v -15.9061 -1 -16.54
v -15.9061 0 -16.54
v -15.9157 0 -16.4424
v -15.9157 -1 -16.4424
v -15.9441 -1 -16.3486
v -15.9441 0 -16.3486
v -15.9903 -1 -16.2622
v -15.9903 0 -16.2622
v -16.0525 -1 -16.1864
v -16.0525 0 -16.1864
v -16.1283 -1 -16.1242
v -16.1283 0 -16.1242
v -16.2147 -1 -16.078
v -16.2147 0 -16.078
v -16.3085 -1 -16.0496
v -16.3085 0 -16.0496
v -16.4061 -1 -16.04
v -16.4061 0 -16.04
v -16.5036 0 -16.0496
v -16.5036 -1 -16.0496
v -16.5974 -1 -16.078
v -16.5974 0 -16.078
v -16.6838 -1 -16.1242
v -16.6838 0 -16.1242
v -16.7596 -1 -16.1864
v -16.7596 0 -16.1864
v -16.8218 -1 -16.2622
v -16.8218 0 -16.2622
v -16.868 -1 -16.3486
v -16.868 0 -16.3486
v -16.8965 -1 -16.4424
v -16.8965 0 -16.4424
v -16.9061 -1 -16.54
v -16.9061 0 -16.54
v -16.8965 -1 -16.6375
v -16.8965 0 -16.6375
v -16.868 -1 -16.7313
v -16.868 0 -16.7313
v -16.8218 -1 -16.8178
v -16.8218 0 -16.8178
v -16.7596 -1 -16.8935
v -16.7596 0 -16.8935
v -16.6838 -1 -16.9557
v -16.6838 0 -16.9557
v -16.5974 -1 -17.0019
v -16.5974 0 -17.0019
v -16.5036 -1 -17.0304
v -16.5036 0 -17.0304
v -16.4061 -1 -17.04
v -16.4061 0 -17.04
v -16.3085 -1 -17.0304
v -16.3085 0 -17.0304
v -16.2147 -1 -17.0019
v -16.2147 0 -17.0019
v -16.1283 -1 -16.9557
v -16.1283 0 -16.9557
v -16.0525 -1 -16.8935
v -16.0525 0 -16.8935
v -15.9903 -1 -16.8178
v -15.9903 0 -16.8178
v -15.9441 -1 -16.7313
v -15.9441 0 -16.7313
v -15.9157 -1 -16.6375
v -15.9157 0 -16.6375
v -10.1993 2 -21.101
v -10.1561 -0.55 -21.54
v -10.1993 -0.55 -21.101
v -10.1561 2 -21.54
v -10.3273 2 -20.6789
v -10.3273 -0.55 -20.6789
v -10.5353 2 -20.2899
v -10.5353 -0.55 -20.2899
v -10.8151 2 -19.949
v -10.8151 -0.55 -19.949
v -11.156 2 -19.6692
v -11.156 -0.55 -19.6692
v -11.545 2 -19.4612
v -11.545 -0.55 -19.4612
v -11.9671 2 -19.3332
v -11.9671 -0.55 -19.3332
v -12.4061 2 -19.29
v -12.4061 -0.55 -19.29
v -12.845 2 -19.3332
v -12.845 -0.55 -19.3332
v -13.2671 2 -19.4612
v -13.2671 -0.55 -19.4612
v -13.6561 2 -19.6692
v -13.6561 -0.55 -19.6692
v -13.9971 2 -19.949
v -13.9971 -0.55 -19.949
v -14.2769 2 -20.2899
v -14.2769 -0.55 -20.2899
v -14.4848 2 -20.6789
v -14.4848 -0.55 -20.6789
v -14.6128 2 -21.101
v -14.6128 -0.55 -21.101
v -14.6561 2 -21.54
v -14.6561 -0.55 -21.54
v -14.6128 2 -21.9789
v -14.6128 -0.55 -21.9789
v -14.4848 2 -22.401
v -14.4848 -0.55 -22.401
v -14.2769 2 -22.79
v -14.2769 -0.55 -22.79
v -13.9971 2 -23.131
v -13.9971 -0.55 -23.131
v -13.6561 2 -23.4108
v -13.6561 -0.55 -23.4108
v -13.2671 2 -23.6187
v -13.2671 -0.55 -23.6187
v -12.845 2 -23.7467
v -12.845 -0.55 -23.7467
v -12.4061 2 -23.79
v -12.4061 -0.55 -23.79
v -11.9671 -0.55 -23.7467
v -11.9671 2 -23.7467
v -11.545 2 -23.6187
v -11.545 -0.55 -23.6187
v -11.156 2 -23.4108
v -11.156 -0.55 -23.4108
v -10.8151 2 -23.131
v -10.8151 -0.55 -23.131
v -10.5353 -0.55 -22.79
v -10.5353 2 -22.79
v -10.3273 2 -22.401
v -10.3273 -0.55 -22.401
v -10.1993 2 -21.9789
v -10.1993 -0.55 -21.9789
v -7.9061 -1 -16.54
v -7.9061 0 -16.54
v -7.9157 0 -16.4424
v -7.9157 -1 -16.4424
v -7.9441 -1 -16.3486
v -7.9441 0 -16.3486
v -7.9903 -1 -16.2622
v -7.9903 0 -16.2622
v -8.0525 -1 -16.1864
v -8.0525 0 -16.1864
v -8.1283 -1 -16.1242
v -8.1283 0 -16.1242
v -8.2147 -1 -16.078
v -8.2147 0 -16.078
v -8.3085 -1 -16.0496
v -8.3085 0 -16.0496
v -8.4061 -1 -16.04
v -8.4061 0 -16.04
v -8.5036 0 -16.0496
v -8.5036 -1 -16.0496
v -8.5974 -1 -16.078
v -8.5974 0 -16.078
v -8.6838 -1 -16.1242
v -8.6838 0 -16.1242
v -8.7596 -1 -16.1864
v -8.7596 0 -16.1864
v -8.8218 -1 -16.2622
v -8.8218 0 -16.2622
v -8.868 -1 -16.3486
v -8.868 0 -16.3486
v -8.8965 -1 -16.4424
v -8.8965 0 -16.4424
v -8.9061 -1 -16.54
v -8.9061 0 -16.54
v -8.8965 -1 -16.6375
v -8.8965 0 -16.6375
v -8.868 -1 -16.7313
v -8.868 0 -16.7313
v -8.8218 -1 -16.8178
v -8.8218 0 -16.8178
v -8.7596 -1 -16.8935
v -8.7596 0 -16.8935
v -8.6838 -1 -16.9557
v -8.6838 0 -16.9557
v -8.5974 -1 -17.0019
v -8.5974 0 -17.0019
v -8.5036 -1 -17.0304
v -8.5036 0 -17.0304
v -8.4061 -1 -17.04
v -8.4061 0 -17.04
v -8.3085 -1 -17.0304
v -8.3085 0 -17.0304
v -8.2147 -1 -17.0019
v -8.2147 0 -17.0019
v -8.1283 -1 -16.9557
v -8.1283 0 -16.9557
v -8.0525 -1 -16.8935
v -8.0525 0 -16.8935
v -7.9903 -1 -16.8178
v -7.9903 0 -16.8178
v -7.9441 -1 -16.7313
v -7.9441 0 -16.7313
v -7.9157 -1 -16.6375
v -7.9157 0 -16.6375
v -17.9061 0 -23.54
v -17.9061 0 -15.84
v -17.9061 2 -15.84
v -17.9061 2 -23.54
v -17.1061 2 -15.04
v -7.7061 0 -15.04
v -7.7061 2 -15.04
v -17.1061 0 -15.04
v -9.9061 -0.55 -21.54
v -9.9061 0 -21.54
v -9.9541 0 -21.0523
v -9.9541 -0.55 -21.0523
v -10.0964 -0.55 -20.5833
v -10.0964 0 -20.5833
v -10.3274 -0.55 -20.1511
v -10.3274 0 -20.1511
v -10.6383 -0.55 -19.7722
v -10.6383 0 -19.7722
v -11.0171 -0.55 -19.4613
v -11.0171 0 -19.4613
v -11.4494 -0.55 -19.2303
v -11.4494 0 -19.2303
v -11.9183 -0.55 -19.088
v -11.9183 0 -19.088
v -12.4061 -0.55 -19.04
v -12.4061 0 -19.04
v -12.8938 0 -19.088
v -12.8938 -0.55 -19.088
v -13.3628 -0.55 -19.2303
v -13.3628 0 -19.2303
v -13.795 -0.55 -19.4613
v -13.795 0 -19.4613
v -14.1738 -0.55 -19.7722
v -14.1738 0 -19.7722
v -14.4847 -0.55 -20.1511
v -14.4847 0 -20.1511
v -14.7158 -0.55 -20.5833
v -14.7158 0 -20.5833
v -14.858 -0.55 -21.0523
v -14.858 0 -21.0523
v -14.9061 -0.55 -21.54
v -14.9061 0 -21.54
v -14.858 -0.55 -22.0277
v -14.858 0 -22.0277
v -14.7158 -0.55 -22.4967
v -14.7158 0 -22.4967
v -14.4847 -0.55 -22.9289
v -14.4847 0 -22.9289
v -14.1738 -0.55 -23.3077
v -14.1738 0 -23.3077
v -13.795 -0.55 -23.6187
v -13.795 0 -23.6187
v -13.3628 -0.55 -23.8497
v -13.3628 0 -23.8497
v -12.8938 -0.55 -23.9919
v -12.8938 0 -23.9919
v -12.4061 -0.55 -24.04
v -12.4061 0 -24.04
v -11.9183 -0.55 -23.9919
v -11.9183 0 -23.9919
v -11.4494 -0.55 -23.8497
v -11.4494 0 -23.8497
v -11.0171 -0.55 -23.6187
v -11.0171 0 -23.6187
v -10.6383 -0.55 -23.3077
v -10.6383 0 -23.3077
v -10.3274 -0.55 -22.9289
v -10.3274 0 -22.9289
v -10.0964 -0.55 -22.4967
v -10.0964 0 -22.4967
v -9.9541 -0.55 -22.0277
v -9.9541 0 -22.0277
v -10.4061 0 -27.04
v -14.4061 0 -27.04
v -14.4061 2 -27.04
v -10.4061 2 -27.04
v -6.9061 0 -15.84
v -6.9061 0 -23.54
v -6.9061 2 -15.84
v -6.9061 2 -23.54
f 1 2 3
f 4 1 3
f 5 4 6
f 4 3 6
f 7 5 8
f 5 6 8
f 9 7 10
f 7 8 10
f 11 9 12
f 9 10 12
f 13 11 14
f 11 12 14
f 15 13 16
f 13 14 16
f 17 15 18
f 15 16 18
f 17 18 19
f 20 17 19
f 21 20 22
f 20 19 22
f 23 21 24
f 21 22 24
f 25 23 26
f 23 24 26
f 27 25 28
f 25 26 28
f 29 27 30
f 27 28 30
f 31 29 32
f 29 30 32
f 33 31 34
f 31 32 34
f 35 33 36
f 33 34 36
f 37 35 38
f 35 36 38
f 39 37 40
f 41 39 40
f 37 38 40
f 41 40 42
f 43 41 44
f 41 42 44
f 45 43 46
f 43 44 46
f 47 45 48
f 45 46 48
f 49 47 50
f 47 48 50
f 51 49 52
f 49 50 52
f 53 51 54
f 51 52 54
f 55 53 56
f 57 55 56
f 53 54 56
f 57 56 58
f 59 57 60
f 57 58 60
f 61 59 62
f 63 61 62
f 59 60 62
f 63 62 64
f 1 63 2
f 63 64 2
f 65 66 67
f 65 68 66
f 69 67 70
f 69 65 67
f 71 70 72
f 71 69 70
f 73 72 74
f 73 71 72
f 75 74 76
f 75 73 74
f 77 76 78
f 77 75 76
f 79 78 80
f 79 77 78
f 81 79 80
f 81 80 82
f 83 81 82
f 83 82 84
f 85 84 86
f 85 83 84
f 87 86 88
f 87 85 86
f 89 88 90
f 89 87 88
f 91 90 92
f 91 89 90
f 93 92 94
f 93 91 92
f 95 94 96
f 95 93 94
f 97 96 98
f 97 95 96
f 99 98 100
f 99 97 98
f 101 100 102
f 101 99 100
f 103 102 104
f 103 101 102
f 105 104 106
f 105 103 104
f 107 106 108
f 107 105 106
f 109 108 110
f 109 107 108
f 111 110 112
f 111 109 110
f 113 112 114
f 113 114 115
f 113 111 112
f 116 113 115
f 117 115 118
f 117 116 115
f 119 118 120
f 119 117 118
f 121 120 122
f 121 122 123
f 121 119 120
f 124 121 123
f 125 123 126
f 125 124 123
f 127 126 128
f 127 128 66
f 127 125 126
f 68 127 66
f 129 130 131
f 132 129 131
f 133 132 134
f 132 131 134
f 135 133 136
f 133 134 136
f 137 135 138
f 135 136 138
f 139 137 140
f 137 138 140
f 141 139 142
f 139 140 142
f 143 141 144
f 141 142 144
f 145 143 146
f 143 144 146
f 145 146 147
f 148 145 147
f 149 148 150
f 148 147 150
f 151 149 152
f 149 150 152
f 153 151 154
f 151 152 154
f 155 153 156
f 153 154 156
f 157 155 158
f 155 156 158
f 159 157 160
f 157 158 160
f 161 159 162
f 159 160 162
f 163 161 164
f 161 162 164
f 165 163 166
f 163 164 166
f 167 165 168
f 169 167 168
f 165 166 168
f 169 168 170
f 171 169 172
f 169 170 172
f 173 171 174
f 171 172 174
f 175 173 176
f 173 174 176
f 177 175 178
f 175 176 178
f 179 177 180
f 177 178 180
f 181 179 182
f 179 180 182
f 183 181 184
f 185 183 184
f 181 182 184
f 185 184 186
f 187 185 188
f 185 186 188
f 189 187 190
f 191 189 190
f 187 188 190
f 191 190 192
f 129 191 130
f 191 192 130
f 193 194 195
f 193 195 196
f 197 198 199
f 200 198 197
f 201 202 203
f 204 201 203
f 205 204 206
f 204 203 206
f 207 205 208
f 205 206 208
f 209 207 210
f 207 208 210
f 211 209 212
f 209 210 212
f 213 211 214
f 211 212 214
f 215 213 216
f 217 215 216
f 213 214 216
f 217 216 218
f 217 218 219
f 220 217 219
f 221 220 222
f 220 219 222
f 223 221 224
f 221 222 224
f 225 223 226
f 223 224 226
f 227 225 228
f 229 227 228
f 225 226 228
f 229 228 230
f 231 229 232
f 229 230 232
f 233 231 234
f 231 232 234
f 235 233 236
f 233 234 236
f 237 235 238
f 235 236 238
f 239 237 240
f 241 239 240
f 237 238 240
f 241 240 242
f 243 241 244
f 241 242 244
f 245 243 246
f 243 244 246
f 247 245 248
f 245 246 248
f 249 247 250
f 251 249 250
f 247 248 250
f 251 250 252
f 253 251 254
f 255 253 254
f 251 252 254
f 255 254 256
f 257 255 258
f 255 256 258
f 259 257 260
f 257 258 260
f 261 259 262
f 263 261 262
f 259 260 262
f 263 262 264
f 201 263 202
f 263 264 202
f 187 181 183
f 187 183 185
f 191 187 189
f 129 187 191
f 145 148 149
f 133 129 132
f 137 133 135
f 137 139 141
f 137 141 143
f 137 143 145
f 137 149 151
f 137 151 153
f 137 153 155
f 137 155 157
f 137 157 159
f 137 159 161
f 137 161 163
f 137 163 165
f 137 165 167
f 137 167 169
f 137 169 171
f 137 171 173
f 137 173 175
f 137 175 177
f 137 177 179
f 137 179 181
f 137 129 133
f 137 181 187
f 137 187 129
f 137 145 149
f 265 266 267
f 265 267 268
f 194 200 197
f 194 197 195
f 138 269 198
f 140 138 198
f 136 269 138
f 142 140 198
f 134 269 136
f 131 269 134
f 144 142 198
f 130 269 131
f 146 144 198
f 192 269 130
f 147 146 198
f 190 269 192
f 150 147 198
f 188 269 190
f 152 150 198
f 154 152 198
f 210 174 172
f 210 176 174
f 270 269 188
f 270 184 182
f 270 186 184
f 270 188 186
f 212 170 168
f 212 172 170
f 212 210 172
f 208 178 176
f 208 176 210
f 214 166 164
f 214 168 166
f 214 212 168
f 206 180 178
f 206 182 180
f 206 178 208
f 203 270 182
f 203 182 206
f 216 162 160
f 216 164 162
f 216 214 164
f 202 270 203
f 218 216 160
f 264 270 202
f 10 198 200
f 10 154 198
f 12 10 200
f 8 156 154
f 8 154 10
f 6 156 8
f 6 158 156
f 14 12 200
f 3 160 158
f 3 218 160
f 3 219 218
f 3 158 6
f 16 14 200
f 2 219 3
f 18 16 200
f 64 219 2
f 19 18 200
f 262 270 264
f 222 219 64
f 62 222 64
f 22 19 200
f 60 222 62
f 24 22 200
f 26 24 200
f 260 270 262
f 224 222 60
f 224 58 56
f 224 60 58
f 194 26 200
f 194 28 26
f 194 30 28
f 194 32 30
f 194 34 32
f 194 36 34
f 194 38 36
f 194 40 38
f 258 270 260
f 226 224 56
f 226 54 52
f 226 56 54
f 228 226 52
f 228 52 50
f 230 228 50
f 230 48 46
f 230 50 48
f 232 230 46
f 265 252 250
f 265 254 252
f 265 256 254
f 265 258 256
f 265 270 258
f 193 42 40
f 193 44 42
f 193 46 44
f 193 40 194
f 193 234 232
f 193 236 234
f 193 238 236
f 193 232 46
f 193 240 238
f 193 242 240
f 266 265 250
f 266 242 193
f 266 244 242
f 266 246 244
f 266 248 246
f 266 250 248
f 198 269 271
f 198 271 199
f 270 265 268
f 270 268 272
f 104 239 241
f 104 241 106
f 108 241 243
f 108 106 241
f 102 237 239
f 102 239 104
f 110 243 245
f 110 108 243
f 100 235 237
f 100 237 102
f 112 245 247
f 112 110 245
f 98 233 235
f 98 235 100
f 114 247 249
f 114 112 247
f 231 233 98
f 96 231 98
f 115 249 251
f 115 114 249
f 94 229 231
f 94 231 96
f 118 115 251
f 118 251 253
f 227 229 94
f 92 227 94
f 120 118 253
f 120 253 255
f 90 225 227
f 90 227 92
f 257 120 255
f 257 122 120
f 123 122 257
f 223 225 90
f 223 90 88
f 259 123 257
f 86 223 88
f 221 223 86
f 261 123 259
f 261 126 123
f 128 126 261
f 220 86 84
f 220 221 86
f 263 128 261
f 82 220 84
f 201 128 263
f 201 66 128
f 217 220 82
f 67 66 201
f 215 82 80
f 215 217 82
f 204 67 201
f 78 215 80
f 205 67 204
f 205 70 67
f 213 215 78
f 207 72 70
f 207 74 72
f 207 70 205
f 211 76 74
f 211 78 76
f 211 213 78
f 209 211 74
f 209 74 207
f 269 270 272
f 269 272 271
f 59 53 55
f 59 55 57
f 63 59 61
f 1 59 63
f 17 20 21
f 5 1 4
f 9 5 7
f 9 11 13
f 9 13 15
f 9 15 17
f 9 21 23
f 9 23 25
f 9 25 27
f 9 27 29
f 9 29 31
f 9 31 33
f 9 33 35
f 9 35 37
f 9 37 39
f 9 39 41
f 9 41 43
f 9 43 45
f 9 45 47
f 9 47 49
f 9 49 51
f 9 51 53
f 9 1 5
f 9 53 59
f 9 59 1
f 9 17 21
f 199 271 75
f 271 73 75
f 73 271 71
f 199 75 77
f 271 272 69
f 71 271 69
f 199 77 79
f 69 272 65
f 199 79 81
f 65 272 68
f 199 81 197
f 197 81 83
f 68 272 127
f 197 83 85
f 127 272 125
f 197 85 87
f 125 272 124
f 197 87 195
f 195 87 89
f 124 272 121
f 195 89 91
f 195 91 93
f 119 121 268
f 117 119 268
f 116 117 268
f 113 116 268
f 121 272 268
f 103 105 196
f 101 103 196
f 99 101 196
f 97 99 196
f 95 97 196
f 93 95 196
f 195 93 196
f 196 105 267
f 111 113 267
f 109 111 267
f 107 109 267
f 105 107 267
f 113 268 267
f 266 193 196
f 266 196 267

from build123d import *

# Parameters (mm, degrees)
SKETCH1_R           = 2.25
BOSS_EXTRUDE1_DEPTH = 2
SKETCH2_R           = 2.5
SKETCH2_R_2         = 2.25
BOSS_EXTRUDE2_DEPTH = 0.55
SKETCH3_R           = 0.5
BOSS_EXTRUDE3_DEPTH = 1


with BuildPart() as part:
    # Sketch1 → Boss-Extrude1 (new body)
    with BuildSketch(Plane(origin=(0, 0, 0), x_dir=(1, 0, 0), z_dir=(0, 1, 0))):
        Polygon((-17.906062461, 15.839978331), (-17.906062461, 23.539978331), (-14.406062461, 27.039978331), (-10.406062461, 27.039978331), (-6.906062461, 23.539978331), (-6.906062461, 15.839978331), (-7.706062461, 15.039978331), (-17.106062461, 15.039978331), align=None)
        with Locations((-12.406062461, 21.539978331)):
            Circle(SKETCH1_R, mode=Mode.SUBTRACT)
    extrude(amount=BOSS_EXTRUDE1_DEPTH)

    # Sketch2 → Boss-Extrude2 (add)
    with BuildSketch(Plane.XZ):
        with Locations((-12.406062461, -21.539978331)):
            Circle(SKETCH2_R)
        with Locations((-12.406062461, -21.539978331)):
            Circle(SKETCH2_R_2, mode=Mode.SUBTRACT)
    extrude(amount=BOSS_EXTRUDE2_DEPTH)

    # Sketch3 → Boss-Extrude3 (add)
    with BuildSketch(Plane.XZ):
        with Locations((-16.406062461, -16.539978331)):
            Circle(SKETCH3_R)
        with Locations((-8.406062461, -16.539978331)):
            Circle(SKETCH3_R)
    extrude(amount=BOSS_EXTRUDE3_DEPTH)


solid = part.part
